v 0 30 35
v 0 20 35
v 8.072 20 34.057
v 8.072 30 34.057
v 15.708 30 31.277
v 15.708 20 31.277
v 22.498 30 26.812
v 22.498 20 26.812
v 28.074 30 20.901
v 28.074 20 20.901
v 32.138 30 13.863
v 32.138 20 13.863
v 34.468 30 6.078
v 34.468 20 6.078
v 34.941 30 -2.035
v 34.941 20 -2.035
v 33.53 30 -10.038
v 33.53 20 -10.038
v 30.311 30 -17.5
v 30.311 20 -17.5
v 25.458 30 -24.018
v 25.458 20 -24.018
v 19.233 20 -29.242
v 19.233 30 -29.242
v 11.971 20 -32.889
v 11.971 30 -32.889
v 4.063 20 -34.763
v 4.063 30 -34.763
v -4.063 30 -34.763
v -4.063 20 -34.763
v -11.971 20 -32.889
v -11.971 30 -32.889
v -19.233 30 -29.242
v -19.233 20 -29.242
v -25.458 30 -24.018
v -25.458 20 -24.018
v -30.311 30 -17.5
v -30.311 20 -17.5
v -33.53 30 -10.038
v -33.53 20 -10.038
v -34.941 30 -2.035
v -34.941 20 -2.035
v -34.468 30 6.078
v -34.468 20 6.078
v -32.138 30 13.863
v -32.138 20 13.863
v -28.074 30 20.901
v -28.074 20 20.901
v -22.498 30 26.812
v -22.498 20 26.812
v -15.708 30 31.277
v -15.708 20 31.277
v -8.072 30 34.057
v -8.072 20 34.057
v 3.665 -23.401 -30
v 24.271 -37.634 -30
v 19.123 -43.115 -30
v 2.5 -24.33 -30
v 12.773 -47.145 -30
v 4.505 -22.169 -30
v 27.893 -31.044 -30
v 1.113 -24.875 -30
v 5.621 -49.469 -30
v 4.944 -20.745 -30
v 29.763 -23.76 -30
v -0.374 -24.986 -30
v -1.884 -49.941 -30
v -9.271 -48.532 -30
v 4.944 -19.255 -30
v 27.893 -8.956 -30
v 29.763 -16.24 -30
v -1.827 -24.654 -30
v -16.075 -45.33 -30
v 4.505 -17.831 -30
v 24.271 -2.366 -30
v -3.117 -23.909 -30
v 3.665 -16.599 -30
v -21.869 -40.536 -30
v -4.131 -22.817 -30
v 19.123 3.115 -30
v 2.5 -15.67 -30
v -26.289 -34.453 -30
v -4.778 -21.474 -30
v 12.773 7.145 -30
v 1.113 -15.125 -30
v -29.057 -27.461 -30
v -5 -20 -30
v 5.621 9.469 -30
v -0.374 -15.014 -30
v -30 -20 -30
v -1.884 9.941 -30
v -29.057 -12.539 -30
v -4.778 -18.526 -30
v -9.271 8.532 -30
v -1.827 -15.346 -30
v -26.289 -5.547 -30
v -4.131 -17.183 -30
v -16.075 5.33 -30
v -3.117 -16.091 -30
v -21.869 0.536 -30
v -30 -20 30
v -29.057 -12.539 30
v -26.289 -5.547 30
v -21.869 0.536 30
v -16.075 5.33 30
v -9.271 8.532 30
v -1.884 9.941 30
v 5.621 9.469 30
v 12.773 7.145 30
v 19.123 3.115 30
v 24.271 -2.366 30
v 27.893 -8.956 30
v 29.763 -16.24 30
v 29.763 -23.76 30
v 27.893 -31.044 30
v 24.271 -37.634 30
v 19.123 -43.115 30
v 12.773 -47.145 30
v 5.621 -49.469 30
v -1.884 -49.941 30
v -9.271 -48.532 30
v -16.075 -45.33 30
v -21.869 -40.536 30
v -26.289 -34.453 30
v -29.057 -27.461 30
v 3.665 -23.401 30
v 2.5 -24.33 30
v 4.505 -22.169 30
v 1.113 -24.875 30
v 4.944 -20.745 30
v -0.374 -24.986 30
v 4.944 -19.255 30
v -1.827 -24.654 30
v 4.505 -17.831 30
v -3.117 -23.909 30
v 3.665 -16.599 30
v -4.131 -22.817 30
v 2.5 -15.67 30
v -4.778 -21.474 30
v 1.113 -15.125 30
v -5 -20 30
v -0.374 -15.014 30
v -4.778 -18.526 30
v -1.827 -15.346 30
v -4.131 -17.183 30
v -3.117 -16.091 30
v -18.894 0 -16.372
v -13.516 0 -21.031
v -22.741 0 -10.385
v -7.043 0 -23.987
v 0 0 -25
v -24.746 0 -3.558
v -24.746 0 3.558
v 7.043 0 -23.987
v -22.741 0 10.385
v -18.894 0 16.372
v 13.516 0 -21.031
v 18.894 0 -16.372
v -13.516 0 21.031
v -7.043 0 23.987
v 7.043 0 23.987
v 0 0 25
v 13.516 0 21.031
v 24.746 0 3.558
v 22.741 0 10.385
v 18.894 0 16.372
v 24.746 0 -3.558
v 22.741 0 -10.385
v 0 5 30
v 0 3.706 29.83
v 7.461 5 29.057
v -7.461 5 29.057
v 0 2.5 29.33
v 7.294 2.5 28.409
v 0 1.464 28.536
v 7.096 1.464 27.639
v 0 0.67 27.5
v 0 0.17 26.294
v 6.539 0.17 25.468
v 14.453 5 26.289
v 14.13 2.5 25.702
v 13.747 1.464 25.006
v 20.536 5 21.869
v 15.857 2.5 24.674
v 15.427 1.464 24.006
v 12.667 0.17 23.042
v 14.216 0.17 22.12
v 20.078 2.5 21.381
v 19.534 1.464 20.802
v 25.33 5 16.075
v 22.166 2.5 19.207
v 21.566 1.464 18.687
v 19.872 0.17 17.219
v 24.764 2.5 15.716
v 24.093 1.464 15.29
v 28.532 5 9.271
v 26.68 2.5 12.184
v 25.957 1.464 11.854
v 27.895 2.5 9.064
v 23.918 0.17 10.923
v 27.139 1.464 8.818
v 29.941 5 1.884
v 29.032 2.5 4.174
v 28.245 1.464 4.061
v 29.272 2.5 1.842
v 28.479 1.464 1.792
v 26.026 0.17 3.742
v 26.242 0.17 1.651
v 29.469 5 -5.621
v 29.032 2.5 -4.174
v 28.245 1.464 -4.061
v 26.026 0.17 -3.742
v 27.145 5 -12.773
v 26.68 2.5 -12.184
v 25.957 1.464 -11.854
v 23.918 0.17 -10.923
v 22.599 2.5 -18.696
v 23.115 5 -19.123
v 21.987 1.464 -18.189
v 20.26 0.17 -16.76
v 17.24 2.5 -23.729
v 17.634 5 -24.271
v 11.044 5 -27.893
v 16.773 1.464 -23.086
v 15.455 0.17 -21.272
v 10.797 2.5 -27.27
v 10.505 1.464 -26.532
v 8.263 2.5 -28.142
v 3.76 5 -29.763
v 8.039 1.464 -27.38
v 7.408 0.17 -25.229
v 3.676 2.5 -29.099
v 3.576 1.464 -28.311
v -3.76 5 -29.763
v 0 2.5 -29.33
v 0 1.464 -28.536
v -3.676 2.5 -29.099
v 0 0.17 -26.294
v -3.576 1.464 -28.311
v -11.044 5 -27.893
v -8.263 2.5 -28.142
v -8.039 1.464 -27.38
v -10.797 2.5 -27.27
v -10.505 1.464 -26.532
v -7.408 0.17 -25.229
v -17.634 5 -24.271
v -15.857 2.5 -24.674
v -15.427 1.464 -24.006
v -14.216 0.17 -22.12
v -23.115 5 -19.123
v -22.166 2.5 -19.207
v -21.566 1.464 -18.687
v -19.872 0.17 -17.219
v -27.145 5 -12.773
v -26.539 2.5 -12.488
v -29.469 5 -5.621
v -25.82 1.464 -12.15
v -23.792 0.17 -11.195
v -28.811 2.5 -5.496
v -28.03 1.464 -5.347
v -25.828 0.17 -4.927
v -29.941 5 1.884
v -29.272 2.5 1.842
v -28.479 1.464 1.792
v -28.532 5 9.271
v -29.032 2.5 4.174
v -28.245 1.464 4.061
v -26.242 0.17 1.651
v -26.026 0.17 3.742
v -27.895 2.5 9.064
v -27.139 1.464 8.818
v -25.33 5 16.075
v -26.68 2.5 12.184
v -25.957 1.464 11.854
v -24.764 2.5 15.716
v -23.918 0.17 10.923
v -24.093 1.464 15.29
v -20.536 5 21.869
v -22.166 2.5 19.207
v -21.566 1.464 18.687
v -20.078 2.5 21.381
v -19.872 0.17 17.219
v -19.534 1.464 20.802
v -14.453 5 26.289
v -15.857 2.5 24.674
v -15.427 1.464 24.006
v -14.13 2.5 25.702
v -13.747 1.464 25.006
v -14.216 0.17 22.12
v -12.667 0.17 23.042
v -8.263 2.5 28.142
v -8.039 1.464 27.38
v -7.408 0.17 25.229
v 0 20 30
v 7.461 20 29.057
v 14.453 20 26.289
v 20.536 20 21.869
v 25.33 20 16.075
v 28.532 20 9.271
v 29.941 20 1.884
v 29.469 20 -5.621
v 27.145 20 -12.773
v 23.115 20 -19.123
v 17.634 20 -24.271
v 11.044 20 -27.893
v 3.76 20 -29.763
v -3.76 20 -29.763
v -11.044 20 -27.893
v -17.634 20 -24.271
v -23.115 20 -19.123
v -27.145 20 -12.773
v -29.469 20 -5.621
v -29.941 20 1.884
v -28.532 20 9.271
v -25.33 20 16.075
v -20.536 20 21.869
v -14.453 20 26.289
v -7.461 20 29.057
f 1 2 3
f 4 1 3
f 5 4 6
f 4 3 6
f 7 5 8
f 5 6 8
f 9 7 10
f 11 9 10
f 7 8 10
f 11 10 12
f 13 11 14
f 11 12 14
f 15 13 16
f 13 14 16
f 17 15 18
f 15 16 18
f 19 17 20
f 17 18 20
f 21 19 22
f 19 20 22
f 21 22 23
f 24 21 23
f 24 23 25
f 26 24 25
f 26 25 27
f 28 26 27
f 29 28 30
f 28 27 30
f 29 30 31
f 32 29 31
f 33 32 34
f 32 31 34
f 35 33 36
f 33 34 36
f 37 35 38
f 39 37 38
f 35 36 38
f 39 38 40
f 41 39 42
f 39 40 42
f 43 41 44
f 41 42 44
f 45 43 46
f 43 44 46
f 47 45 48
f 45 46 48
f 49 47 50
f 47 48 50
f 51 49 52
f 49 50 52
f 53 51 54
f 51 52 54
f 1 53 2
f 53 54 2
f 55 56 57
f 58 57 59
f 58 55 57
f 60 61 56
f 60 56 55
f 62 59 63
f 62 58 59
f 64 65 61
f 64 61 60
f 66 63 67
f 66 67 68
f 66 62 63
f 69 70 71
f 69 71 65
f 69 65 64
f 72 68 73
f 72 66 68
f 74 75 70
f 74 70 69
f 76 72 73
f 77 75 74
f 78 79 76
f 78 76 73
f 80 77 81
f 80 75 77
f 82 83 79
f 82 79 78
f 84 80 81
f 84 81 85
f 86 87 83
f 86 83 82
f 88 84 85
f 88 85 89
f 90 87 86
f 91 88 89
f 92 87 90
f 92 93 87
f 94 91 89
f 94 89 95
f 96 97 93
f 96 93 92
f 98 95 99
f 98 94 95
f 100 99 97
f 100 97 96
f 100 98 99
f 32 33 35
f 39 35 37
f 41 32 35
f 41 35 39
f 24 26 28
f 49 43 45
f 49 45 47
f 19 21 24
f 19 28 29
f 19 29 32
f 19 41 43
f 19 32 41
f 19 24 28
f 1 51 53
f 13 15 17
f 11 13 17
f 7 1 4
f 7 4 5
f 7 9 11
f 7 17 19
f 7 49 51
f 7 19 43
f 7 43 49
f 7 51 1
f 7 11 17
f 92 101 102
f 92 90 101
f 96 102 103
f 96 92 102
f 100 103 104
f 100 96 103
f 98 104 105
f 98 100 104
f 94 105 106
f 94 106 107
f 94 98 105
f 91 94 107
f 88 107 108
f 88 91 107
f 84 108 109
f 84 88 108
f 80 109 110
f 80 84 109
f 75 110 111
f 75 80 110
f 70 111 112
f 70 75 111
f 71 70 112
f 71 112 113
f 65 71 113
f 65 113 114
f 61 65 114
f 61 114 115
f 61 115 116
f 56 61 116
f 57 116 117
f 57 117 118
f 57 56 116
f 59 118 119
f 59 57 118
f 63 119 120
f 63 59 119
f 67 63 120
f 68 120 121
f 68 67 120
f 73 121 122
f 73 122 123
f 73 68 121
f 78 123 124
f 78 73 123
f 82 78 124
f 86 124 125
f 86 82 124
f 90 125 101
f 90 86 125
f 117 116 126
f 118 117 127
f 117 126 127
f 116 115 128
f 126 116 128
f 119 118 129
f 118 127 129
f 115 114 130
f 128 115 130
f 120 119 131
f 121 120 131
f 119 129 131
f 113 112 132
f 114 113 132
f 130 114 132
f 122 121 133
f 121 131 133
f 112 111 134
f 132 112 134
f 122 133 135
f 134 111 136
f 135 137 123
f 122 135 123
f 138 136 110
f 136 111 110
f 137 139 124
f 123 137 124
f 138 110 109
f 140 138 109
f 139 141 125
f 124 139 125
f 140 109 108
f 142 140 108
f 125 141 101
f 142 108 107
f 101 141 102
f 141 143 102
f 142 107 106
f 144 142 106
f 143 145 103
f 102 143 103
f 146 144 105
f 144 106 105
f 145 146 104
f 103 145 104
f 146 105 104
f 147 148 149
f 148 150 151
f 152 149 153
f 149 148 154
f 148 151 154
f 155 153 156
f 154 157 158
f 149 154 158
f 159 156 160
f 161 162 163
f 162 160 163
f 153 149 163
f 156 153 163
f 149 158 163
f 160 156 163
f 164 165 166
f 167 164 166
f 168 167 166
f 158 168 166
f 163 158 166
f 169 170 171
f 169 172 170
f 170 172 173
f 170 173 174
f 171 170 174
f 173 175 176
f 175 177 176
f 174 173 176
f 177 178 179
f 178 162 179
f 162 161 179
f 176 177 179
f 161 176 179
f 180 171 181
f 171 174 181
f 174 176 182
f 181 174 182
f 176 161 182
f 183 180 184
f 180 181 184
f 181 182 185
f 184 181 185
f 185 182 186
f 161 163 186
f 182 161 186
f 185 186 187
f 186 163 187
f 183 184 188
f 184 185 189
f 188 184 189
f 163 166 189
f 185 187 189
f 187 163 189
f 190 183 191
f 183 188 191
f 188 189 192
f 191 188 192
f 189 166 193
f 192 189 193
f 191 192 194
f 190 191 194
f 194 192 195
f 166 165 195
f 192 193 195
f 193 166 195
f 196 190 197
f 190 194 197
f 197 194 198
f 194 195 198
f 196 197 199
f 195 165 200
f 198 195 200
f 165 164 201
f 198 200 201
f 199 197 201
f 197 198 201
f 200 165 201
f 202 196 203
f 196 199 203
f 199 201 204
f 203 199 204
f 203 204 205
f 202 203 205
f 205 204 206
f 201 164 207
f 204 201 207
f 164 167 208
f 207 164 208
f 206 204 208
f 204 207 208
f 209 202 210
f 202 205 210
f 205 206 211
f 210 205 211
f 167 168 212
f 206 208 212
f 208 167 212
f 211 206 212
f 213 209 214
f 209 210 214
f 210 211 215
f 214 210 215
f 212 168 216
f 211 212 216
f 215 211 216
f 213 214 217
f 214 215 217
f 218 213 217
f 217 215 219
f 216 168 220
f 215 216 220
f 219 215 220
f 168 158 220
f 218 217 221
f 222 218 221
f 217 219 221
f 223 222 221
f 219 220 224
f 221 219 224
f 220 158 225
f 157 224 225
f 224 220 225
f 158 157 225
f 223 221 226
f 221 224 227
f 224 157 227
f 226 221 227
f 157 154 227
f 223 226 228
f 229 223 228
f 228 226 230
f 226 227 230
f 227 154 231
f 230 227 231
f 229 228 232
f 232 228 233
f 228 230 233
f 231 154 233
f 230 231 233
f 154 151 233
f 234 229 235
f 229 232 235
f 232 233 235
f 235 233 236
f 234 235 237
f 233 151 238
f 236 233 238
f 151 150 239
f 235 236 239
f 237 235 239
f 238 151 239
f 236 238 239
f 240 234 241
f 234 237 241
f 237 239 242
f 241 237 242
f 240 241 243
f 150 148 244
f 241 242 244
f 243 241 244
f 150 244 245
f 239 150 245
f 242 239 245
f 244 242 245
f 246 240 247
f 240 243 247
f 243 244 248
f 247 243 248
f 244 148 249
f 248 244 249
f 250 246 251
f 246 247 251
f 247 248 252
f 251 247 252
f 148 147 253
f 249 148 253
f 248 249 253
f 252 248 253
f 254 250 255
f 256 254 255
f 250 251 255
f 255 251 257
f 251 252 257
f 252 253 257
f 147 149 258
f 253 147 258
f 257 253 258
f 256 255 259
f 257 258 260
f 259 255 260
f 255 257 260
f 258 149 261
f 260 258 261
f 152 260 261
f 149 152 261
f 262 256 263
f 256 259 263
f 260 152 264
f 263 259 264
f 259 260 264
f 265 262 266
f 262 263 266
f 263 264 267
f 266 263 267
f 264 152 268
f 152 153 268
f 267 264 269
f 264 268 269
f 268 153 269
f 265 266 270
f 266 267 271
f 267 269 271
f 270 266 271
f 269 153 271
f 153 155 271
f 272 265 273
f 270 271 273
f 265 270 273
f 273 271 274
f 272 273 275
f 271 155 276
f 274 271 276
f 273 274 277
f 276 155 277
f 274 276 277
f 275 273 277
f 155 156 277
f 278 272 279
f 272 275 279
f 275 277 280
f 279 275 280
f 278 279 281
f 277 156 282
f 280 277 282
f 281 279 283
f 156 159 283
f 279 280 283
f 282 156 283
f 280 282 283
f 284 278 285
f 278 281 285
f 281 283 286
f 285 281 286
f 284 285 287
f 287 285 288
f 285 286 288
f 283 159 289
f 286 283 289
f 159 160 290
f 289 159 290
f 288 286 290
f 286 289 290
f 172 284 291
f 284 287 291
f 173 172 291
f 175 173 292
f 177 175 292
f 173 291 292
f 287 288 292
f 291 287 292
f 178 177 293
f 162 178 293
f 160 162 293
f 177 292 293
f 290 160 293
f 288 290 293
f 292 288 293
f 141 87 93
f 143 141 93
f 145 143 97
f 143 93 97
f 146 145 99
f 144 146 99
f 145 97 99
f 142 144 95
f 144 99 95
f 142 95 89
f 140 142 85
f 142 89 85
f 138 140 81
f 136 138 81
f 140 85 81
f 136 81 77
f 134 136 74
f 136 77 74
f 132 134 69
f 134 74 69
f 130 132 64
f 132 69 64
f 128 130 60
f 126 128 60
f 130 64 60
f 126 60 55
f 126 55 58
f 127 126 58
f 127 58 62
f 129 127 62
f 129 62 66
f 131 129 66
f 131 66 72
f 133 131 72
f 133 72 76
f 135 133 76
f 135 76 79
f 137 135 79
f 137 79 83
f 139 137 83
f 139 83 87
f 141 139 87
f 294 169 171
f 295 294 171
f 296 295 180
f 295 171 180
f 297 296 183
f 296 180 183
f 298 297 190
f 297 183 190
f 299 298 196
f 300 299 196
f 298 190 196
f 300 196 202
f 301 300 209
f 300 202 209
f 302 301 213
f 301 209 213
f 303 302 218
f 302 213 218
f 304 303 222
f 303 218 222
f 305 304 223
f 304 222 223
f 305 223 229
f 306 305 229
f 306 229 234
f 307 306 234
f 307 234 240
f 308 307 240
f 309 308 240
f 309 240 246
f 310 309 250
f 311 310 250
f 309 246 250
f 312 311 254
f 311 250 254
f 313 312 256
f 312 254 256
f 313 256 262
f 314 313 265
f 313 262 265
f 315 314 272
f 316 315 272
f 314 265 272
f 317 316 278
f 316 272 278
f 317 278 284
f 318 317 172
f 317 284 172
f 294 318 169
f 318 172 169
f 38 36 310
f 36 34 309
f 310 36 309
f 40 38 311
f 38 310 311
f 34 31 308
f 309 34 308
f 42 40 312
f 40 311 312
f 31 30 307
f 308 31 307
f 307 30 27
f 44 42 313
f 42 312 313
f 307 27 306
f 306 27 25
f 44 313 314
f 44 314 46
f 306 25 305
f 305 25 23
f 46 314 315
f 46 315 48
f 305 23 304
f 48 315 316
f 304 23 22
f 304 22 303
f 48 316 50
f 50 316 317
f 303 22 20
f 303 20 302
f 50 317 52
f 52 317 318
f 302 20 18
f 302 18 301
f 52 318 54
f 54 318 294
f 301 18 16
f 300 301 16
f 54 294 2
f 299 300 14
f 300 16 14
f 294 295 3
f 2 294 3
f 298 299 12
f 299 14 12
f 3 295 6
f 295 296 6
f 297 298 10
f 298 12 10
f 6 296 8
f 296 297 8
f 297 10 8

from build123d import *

# Parameters (mm, degrees)
SKETCH1_R           = 30
BOSS_EXTRUDE1_DEPTH = 20
SKETCH2_R           = 35
BOSS_EXTRUDE2_DEPTH = 10
SKETCH3_R           = 30
BOSS_EXTRUDE3_DEPTH = 30
SKETCH4_R           = 5
CUT_EXTRUDE1_DEPTH  = 90.162772501
RACCORDO1_R         = 5


with BuildPart() as part:
    # Sketch1 → Boss-Extrude1 (new body)
    with BuildSketch(Plane(origin=(0, 0, 0), x_dir=(1, 0, 0), z_dir=(0, 1, 0))):
        with Locations(Location((0, 0, 0), (0, 0, 270))):
            Circle(SKETCH1_R)
    extrude(amount=BOSS_EXTRUDE1_DEPTH)

    # Sketch2 → Boss-Extrude2 (add)
    with BuildSketch(Plane(origin=(0, 20, 0), x_dir=(1, 0, 0), z_dir=(0, 1, 0))):
        with Locations(Location((0, 0, 0), (0, 0, 270))):
            Circle(SKETCH2_R)
    extrude(amount=BOSS_EXTRUDE2_DEPTH)

    # Raccordo1
    raccordo1_edges = [part.edges().sort_by_distance(p)[0] for p in [
        (0, 0, -30),
    ]]
    fillet(raccordo1_edges, radius=RACCORDO1_R)


with BuildPart() as body_2:
    # Sketch3 → Boss-Extrude3 (new, symmetric)
    with BuildSketch(Plane(origin=(0, 0, 0), x_dir=(-1, 0, 0), z_dir=(0, 0, -1))):
        with Locations((0, -20)):
            Circle(SKETCH3_R)
    extrude(amount=BOSS_EXTRUDE3_DEPTH, both=True)

    # Sketch4 → Cut-Extrude1 (cut, through all)
    with BuildSketch(Plane(origin=(0, 0, -30), x_dir=(-1, 0, 0), z_dir=(0, 0, -1))):
        with Locations((0, -20)):
            Circle(SKETCH4_R)
    extrude(amount=-CUT_EXTRUDE1_DEPTH, mode=Mode.SUBTRACT)


solid = Compound([part.part, body_2.part])
